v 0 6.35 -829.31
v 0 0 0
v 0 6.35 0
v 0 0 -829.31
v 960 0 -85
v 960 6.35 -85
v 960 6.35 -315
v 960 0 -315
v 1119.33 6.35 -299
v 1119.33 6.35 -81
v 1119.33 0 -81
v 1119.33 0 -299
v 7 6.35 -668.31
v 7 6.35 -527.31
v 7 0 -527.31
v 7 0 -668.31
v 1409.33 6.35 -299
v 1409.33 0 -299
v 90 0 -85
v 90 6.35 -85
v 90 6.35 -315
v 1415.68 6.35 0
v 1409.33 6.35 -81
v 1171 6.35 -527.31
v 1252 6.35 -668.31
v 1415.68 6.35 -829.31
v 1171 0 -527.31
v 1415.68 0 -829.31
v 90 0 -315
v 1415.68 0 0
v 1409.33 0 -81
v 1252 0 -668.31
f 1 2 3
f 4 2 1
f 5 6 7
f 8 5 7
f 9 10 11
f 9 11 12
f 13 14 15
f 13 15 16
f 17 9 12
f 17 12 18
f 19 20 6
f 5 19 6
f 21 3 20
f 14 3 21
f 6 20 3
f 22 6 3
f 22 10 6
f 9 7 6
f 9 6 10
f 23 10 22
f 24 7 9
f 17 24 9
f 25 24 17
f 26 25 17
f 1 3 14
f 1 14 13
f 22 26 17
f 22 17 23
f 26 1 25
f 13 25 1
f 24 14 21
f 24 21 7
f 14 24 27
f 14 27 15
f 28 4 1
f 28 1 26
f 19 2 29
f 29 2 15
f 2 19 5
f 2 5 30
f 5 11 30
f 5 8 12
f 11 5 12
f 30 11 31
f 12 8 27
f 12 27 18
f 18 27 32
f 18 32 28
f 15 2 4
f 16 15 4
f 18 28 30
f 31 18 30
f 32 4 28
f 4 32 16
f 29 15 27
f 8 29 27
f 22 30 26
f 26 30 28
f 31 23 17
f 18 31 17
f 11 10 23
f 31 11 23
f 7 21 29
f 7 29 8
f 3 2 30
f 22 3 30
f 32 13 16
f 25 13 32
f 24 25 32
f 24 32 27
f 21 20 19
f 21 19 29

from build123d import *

# Parameters (mm, degrees)
SKETCH1_W           = 1415.68
SKETCH1_H           = 829.31
BOSS_EXTRUDE1_DEPTH = 6.35
CUT_EXTRUDE1_REACH  = 1642.715
SKETCH2_W           = 870
SKETCH2_H           = 230
SKETCH2_W_2         = 290
SKETCH2_H_2         = 218


with BuildPart() as part:
    # Sketch1 → Boss-Extrude1 (new body)
    with BuildSketch(Plane(origin=(0, 0, 0), x_dir=(1, 0, 0), z_dir=(0, 1, 0))):
        with Locations((707.84, 414.655)):
            Rectangle(SKETCH1_W, SKETCH1_H)
    extrude(amount=BOSS_EXTRUDE1_DEPTH)

    # Sketch2 → Cut-Extrude1 (cut, up to next)
    with BuildSketch(Plane(origin=(0, 6.35, 0), x_dir=(1, 0, 0), z_dir=(0, 1, 0)), mode=Mode.PRIVATE) as cut_extrude1_sk1:
        with Locations((525, 200)):
            Rectangle(SKETCH2_W, SKETCH2_H)
    cut_extrude1_tool1 = extrude(cut_extrude1_sk1.sketch, amount=-CUT_EXTRUDE1_REACH, mode=Mode.PRIVATE) & part.part
    # Sketch2 → Cut-Extrude1 (cut, up to next)
    with BuildSketch(Plane(origin=(0, 6.35, 0), x_dir=(1, 0, 0), z_dir=(0, 1, 0)), mode=Mode.PRIVATE) as cut_extrude1_sk2:
        Polygon((7, 668.31), (1252, 668.31), (1171, 527.31), (7, 527.31), align=None)
    cut_extrude1_tool2 = extrude(cut_extrude1_sk2.sketch, amount=-CUT_EXTRUDE1_REACH, mode=Mode.PRIVATE) & part.part
    # Sketch2 → Cut-Extrude1 (cut, up to next)
    with BuildSketch(Plane(origin=(0, 6.35, 0), x_dir=(1, 0, 0), z_dir=(0, 1, 0)), mode=Mode.PRIVATE) as cut_extrude1_sk3:
        with Locations((1264.33, 190)):
            Rectangle(SKETCH2_W_2, SKETCH2_H_2)
    cut_extrude1_tool3 = extrude(cut_extrude1_sk3.sketch, amount=-CUT_EXTRUDE1_REACH, mode=Mode.PRIVATE) & part.part
    add(cut_extrude1_tool1.solids().sort_by_distance((525, 6.35, -200))[0], mode=Mode.SUBTRACT)
    add(cut_extrude1_tool2.solids().sort_by_distance((609.476961, 6.35, -598.600162))[0], mode=Mode.SUBTRACT)
    add(cut_extrude1_tool3.solids().sort_by_distance((1264.33, 6.35, -190))[0], mode=Mode.SUBTRACT)


solid = part.part
